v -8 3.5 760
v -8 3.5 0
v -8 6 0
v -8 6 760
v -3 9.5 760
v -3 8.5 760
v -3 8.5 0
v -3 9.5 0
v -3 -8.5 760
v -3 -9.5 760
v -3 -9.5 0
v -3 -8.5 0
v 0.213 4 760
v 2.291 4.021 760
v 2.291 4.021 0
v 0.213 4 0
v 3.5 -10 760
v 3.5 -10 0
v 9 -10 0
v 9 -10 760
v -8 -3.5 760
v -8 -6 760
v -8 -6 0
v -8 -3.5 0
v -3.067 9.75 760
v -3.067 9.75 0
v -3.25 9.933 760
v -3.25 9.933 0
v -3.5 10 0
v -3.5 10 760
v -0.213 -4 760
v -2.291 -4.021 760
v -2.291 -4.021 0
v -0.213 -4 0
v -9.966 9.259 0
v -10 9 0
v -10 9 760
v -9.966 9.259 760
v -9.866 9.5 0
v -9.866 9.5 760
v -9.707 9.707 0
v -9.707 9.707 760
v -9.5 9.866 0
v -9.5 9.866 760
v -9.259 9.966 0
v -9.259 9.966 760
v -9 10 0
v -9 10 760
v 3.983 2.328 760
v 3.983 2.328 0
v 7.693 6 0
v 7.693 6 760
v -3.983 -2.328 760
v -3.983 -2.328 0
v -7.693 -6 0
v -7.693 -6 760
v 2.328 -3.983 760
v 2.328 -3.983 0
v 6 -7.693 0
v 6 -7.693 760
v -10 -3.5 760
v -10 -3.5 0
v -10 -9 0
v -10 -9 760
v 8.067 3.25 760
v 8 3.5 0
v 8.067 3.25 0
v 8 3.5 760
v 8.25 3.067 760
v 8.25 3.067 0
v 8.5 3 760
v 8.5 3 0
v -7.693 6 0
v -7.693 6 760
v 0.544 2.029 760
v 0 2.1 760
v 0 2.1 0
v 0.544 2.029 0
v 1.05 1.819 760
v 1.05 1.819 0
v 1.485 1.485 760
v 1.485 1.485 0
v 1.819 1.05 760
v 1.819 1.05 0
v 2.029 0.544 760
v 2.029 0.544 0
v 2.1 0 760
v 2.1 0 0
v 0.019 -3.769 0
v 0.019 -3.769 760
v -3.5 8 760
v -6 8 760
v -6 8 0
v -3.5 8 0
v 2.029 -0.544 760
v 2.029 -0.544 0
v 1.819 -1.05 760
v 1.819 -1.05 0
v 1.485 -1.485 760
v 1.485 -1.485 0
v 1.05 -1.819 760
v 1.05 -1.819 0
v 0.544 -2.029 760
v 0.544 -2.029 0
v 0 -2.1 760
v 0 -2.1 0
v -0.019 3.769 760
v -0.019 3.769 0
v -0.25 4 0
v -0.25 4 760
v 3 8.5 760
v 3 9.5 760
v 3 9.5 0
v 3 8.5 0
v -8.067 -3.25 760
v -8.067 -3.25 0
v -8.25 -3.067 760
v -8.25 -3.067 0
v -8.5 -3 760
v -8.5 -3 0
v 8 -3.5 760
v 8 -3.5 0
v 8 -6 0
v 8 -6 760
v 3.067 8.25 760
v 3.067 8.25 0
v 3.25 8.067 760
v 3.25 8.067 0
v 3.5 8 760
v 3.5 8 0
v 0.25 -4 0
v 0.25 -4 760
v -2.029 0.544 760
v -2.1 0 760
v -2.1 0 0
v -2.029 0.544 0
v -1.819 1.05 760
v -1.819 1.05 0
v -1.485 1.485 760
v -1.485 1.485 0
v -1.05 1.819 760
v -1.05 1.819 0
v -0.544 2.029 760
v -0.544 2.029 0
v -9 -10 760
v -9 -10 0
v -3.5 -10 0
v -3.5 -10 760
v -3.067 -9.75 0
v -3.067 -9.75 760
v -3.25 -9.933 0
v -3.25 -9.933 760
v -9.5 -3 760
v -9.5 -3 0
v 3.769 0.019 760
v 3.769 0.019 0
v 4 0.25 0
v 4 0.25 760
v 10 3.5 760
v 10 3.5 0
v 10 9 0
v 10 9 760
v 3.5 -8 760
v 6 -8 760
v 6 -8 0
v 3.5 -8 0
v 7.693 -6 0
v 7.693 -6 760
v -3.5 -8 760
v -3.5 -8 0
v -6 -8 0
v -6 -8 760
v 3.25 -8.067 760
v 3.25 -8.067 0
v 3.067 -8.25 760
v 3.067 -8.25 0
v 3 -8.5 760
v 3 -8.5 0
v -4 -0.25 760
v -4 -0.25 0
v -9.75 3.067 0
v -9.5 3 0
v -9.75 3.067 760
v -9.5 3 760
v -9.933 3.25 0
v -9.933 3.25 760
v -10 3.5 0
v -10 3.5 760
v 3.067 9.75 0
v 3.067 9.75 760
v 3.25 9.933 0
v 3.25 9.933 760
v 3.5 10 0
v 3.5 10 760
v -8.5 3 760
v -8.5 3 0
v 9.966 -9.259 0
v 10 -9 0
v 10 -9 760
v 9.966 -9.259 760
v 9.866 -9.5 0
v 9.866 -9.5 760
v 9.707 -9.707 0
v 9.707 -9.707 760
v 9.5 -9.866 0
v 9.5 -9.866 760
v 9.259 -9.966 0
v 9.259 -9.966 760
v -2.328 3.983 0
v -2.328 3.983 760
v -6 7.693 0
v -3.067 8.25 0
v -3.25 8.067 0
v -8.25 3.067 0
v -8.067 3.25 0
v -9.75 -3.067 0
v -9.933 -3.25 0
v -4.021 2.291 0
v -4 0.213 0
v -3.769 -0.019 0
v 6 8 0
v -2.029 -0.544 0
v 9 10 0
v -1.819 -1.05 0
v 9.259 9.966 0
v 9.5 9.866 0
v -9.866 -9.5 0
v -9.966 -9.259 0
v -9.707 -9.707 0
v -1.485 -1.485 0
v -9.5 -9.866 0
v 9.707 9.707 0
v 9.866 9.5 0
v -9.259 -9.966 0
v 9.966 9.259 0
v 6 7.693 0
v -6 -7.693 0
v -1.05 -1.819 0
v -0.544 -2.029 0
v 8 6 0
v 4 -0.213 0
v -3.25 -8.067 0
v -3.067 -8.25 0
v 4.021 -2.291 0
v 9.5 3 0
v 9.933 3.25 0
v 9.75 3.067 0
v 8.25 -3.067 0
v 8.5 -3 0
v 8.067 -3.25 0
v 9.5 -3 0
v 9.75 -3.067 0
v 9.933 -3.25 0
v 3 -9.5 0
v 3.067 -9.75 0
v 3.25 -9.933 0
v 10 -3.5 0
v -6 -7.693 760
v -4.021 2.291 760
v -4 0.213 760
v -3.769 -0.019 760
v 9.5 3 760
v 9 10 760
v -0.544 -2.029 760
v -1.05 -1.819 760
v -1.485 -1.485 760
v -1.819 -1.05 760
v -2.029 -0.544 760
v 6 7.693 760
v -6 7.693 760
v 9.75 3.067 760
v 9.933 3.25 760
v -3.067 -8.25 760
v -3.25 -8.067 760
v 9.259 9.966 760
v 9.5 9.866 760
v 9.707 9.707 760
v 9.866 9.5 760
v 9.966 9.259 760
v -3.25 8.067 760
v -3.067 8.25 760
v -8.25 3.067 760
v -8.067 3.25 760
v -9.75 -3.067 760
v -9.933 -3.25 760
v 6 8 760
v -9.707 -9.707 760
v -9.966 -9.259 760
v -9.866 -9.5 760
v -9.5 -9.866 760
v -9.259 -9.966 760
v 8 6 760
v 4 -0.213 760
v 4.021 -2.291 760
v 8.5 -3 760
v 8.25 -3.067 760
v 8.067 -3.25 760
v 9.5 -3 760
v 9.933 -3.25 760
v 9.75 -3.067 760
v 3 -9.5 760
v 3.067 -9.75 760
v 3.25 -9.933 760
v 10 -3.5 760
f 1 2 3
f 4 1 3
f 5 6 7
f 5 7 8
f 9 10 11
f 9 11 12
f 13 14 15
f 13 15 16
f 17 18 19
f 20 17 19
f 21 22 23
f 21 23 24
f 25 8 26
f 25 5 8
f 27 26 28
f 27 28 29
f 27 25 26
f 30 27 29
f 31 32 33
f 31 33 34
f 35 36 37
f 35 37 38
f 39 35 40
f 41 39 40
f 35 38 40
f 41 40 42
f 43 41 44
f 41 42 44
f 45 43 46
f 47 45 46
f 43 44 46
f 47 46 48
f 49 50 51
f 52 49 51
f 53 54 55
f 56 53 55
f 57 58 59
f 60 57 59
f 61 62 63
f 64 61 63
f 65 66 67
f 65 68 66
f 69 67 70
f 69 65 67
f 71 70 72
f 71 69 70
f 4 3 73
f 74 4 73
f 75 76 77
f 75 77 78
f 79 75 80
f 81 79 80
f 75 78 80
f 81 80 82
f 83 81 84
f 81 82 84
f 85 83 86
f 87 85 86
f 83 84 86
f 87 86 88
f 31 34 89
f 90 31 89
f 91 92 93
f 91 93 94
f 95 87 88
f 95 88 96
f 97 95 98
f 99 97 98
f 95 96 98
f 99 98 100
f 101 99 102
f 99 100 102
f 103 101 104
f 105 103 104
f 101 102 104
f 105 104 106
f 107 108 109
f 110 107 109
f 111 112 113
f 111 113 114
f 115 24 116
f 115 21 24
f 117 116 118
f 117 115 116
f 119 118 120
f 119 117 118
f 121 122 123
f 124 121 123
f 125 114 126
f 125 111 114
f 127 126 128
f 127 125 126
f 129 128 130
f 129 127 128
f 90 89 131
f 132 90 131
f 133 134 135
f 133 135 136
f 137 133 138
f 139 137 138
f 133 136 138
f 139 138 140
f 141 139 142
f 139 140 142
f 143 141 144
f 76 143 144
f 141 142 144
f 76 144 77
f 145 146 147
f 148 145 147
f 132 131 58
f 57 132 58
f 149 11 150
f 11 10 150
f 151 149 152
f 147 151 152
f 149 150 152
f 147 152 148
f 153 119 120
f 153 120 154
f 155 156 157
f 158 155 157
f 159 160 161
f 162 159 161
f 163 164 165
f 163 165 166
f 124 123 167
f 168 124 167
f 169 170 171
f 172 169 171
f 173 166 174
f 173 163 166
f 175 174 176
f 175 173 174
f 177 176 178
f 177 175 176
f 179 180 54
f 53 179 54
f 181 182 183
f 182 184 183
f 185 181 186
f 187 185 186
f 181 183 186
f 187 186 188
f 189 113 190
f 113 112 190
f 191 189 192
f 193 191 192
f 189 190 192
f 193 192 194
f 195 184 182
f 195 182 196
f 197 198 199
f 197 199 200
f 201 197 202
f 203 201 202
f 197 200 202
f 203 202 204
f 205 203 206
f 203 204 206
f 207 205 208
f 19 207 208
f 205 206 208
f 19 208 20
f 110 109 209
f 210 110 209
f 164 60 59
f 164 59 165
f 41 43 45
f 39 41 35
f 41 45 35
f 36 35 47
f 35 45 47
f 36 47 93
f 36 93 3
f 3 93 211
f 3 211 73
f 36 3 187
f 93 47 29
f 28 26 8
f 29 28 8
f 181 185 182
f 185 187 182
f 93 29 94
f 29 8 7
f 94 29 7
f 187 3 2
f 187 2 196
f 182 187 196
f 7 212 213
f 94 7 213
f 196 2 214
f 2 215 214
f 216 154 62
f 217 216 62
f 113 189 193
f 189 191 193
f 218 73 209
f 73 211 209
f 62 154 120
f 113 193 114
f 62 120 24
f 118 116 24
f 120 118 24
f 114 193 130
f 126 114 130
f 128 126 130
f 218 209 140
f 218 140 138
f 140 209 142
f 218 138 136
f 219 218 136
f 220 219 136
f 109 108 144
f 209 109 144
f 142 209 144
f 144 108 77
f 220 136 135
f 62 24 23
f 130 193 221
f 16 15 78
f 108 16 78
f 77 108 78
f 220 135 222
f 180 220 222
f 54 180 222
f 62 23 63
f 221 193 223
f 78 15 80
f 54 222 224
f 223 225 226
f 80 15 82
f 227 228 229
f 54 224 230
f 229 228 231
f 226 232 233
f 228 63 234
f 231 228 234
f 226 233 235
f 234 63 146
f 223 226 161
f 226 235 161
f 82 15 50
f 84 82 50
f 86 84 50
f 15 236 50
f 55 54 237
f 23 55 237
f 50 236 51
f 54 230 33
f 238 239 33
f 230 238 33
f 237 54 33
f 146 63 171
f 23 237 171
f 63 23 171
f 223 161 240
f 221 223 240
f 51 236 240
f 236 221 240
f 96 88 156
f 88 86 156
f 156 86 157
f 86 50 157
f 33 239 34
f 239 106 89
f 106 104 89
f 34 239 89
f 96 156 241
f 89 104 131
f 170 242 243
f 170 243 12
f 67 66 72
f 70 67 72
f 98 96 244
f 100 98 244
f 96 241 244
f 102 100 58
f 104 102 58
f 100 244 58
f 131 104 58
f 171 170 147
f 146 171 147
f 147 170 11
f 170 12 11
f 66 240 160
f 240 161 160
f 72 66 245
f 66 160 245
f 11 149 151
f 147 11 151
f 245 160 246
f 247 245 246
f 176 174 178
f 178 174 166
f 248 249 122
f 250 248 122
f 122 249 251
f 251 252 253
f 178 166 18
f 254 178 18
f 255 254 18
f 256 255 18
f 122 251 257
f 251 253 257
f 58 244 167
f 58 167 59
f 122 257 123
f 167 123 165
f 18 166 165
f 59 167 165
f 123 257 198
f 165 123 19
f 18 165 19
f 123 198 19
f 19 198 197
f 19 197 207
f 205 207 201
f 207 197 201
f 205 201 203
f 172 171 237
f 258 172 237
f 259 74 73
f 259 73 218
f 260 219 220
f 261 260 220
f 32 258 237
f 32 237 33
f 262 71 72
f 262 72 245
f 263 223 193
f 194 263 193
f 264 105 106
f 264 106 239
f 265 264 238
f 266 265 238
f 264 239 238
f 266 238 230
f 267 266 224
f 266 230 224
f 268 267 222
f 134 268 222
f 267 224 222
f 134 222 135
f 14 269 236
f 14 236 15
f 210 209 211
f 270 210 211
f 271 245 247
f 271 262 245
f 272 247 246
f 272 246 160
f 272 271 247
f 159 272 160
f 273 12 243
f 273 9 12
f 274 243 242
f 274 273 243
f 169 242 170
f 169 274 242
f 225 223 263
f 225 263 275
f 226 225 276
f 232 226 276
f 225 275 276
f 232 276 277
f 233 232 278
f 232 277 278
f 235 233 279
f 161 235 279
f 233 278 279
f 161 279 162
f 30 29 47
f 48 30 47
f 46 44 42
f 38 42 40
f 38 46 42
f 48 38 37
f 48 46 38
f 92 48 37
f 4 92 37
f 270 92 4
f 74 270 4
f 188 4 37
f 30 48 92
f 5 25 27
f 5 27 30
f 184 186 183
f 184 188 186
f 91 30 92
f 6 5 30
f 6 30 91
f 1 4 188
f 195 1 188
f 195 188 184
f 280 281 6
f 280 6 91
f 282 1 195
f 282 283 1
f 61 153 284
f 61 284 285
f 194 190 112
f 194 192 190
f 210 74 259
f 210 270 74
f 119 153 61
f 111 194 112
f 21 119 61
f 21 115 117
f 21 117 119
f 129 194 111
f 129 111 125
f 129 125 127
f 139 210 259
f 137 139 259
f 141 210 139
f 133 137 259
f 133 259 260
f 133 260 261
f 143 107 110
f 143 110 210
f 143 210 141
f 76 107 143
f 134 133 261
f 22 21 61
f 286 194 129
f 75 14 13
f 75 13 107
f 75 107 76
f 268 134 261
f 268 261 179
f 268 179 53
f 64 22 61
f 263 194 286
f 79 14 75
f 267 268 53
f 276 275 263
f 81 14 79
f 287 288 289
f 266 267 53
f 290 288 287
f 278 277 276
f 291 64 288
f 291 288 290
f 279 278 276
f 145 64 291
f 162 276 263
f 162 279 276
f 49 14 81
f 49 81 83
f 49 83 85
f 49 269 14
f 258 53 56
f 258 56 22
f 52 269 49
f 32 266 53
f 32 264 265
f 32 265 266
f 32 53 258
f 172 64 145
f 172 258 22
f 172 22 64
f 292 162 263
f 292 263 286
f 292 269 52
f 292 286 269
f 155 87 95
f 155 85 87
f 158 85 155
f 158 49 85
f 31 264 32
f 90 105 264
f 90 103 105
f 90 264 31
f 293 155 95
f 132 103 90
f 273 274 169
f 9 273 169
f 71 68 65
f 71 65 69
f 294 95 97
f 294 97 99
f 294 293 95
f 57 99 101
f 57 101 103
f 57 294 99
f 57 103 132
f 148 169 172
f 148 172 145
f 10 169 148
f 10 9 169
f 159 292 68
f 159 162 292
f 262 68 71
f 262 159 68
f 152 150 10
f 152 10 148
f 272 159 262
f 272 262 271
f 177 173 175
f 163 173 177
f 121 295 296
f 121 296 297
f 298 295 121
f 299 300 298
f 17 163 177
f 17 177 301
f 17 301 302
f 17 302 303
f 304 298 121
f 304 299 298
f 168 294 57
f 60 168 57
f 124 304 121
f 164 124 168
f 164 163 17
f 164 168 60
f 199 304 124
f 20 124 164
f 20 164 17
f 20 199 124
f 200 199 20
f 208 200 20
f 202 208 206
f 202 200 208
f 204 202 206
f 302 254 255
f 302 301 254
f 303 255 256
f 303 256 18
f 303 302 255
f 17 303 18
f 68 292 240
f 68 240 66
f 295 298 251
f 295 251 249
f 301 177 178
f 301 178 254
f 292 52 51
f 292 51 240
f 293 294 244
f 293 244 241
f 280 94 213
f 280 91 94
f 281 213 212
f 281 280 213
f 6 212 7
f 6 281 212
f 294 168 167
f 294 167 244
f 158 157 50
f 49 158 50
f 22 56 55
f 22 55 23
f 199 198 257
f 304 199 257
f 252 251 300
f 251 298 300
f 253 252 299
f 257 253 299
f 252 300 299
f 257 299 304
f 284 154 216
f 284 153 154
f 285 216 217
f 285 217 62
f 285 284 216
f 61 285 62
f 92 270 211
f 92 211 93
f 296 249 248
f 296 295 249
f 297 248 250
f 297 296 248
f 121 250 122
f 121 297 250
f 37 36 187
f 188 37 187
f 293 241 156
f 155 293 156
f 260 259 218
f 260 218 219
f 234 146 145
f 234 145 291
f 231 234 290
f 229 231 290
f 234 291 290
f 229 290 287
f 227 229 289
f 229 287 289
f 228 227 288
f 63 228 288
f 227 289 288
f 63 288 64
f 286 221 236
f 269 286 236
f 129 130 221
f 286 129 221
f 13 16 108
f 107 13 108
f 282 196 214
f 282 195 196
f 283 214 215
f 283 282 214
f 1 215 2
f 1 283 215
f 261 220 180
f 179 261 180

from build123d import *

# Parameters (mm, degrees)
F2_DEPTH = 760
F4_R     = 0.5
F5_R     = 1
F6_COUNT = 4


with BuildPart() as f2:
    # F1 (on Top) → F2 (new body)
    with BuildSketch(Plane.XY):
        with BuildLine():
            Line((3.0000000262, 10), (3.0000000262, 8))
            Line((3.0000000262, 8), (6.0000000262, 8))
            Line((6.0000000262, 8), (6.0000000262, 7.6925075952))
            Line((6.0000000262, 7.6925075952), (2.290812958, 4.0206899498))
            Line((2.290812958, 4.0206899498), (0.2126651618, 4))
            Line((0.2126651618, 4), (-0.0373348382, 3.75))
            Line((-0.0373348382, 3.75), (-0.0209097774, 2.1002278027))
            ThreePointArc((-0.0209097774, 2.1002278027), (1.4776309645, 1.4925138011), (2.1, 0))
            Line((2.1, 0), (3.7501858474, 0))
            Line((3.7501858474, 0), (4.0001858474, 0.25))
            Line((4.0001858474, 0.25), (3.9833205532, 2.3281823546))
            Line((3.9833205532, 2.3281823546), (7.6925076214, 6))
            Line((7.6925076214, 6), (8.0000000262, 6))
            Line((8.0000000262, 6), (8.0000000262, 3))
            Line((8.0000000262, 3), (10.0000000262, 3))
            Line((10.0000000262, 3), (10.0000000262, 10))
            Line((10.0000000262, 10), (3.0000000262, 10))
        make_face()
    extrude(amount=F2_DEPTH)

    # F4
    f4_edges = [f2.edges().sort_by_distance(p)[0] for p in [
        (3, 10, 380),
        (10, 3, 380),
        (8, 3, 380),
        (3, 8, 380),
    ]]
    fillet(f4_edges, radius=F4_R)

    # F5
    f5_edges = [f2.edges().sort_by_distance(p)[0] for p in [
        (10, 10, 380),
    ]]
    fillet(f5_edges, radius=F5_R)

    # F6: F2 ×4 about axis
    f6_axis = Axis((0, 0, 380), (0, 0, 1))


with BuildPart() as f2_1:
    add(f2.part)
    for i in range(1, F6_COUNT):
        add(f2.part.rotate(f6_axis, i * 360 / F6_COUNT))


solid = f2_1.part
